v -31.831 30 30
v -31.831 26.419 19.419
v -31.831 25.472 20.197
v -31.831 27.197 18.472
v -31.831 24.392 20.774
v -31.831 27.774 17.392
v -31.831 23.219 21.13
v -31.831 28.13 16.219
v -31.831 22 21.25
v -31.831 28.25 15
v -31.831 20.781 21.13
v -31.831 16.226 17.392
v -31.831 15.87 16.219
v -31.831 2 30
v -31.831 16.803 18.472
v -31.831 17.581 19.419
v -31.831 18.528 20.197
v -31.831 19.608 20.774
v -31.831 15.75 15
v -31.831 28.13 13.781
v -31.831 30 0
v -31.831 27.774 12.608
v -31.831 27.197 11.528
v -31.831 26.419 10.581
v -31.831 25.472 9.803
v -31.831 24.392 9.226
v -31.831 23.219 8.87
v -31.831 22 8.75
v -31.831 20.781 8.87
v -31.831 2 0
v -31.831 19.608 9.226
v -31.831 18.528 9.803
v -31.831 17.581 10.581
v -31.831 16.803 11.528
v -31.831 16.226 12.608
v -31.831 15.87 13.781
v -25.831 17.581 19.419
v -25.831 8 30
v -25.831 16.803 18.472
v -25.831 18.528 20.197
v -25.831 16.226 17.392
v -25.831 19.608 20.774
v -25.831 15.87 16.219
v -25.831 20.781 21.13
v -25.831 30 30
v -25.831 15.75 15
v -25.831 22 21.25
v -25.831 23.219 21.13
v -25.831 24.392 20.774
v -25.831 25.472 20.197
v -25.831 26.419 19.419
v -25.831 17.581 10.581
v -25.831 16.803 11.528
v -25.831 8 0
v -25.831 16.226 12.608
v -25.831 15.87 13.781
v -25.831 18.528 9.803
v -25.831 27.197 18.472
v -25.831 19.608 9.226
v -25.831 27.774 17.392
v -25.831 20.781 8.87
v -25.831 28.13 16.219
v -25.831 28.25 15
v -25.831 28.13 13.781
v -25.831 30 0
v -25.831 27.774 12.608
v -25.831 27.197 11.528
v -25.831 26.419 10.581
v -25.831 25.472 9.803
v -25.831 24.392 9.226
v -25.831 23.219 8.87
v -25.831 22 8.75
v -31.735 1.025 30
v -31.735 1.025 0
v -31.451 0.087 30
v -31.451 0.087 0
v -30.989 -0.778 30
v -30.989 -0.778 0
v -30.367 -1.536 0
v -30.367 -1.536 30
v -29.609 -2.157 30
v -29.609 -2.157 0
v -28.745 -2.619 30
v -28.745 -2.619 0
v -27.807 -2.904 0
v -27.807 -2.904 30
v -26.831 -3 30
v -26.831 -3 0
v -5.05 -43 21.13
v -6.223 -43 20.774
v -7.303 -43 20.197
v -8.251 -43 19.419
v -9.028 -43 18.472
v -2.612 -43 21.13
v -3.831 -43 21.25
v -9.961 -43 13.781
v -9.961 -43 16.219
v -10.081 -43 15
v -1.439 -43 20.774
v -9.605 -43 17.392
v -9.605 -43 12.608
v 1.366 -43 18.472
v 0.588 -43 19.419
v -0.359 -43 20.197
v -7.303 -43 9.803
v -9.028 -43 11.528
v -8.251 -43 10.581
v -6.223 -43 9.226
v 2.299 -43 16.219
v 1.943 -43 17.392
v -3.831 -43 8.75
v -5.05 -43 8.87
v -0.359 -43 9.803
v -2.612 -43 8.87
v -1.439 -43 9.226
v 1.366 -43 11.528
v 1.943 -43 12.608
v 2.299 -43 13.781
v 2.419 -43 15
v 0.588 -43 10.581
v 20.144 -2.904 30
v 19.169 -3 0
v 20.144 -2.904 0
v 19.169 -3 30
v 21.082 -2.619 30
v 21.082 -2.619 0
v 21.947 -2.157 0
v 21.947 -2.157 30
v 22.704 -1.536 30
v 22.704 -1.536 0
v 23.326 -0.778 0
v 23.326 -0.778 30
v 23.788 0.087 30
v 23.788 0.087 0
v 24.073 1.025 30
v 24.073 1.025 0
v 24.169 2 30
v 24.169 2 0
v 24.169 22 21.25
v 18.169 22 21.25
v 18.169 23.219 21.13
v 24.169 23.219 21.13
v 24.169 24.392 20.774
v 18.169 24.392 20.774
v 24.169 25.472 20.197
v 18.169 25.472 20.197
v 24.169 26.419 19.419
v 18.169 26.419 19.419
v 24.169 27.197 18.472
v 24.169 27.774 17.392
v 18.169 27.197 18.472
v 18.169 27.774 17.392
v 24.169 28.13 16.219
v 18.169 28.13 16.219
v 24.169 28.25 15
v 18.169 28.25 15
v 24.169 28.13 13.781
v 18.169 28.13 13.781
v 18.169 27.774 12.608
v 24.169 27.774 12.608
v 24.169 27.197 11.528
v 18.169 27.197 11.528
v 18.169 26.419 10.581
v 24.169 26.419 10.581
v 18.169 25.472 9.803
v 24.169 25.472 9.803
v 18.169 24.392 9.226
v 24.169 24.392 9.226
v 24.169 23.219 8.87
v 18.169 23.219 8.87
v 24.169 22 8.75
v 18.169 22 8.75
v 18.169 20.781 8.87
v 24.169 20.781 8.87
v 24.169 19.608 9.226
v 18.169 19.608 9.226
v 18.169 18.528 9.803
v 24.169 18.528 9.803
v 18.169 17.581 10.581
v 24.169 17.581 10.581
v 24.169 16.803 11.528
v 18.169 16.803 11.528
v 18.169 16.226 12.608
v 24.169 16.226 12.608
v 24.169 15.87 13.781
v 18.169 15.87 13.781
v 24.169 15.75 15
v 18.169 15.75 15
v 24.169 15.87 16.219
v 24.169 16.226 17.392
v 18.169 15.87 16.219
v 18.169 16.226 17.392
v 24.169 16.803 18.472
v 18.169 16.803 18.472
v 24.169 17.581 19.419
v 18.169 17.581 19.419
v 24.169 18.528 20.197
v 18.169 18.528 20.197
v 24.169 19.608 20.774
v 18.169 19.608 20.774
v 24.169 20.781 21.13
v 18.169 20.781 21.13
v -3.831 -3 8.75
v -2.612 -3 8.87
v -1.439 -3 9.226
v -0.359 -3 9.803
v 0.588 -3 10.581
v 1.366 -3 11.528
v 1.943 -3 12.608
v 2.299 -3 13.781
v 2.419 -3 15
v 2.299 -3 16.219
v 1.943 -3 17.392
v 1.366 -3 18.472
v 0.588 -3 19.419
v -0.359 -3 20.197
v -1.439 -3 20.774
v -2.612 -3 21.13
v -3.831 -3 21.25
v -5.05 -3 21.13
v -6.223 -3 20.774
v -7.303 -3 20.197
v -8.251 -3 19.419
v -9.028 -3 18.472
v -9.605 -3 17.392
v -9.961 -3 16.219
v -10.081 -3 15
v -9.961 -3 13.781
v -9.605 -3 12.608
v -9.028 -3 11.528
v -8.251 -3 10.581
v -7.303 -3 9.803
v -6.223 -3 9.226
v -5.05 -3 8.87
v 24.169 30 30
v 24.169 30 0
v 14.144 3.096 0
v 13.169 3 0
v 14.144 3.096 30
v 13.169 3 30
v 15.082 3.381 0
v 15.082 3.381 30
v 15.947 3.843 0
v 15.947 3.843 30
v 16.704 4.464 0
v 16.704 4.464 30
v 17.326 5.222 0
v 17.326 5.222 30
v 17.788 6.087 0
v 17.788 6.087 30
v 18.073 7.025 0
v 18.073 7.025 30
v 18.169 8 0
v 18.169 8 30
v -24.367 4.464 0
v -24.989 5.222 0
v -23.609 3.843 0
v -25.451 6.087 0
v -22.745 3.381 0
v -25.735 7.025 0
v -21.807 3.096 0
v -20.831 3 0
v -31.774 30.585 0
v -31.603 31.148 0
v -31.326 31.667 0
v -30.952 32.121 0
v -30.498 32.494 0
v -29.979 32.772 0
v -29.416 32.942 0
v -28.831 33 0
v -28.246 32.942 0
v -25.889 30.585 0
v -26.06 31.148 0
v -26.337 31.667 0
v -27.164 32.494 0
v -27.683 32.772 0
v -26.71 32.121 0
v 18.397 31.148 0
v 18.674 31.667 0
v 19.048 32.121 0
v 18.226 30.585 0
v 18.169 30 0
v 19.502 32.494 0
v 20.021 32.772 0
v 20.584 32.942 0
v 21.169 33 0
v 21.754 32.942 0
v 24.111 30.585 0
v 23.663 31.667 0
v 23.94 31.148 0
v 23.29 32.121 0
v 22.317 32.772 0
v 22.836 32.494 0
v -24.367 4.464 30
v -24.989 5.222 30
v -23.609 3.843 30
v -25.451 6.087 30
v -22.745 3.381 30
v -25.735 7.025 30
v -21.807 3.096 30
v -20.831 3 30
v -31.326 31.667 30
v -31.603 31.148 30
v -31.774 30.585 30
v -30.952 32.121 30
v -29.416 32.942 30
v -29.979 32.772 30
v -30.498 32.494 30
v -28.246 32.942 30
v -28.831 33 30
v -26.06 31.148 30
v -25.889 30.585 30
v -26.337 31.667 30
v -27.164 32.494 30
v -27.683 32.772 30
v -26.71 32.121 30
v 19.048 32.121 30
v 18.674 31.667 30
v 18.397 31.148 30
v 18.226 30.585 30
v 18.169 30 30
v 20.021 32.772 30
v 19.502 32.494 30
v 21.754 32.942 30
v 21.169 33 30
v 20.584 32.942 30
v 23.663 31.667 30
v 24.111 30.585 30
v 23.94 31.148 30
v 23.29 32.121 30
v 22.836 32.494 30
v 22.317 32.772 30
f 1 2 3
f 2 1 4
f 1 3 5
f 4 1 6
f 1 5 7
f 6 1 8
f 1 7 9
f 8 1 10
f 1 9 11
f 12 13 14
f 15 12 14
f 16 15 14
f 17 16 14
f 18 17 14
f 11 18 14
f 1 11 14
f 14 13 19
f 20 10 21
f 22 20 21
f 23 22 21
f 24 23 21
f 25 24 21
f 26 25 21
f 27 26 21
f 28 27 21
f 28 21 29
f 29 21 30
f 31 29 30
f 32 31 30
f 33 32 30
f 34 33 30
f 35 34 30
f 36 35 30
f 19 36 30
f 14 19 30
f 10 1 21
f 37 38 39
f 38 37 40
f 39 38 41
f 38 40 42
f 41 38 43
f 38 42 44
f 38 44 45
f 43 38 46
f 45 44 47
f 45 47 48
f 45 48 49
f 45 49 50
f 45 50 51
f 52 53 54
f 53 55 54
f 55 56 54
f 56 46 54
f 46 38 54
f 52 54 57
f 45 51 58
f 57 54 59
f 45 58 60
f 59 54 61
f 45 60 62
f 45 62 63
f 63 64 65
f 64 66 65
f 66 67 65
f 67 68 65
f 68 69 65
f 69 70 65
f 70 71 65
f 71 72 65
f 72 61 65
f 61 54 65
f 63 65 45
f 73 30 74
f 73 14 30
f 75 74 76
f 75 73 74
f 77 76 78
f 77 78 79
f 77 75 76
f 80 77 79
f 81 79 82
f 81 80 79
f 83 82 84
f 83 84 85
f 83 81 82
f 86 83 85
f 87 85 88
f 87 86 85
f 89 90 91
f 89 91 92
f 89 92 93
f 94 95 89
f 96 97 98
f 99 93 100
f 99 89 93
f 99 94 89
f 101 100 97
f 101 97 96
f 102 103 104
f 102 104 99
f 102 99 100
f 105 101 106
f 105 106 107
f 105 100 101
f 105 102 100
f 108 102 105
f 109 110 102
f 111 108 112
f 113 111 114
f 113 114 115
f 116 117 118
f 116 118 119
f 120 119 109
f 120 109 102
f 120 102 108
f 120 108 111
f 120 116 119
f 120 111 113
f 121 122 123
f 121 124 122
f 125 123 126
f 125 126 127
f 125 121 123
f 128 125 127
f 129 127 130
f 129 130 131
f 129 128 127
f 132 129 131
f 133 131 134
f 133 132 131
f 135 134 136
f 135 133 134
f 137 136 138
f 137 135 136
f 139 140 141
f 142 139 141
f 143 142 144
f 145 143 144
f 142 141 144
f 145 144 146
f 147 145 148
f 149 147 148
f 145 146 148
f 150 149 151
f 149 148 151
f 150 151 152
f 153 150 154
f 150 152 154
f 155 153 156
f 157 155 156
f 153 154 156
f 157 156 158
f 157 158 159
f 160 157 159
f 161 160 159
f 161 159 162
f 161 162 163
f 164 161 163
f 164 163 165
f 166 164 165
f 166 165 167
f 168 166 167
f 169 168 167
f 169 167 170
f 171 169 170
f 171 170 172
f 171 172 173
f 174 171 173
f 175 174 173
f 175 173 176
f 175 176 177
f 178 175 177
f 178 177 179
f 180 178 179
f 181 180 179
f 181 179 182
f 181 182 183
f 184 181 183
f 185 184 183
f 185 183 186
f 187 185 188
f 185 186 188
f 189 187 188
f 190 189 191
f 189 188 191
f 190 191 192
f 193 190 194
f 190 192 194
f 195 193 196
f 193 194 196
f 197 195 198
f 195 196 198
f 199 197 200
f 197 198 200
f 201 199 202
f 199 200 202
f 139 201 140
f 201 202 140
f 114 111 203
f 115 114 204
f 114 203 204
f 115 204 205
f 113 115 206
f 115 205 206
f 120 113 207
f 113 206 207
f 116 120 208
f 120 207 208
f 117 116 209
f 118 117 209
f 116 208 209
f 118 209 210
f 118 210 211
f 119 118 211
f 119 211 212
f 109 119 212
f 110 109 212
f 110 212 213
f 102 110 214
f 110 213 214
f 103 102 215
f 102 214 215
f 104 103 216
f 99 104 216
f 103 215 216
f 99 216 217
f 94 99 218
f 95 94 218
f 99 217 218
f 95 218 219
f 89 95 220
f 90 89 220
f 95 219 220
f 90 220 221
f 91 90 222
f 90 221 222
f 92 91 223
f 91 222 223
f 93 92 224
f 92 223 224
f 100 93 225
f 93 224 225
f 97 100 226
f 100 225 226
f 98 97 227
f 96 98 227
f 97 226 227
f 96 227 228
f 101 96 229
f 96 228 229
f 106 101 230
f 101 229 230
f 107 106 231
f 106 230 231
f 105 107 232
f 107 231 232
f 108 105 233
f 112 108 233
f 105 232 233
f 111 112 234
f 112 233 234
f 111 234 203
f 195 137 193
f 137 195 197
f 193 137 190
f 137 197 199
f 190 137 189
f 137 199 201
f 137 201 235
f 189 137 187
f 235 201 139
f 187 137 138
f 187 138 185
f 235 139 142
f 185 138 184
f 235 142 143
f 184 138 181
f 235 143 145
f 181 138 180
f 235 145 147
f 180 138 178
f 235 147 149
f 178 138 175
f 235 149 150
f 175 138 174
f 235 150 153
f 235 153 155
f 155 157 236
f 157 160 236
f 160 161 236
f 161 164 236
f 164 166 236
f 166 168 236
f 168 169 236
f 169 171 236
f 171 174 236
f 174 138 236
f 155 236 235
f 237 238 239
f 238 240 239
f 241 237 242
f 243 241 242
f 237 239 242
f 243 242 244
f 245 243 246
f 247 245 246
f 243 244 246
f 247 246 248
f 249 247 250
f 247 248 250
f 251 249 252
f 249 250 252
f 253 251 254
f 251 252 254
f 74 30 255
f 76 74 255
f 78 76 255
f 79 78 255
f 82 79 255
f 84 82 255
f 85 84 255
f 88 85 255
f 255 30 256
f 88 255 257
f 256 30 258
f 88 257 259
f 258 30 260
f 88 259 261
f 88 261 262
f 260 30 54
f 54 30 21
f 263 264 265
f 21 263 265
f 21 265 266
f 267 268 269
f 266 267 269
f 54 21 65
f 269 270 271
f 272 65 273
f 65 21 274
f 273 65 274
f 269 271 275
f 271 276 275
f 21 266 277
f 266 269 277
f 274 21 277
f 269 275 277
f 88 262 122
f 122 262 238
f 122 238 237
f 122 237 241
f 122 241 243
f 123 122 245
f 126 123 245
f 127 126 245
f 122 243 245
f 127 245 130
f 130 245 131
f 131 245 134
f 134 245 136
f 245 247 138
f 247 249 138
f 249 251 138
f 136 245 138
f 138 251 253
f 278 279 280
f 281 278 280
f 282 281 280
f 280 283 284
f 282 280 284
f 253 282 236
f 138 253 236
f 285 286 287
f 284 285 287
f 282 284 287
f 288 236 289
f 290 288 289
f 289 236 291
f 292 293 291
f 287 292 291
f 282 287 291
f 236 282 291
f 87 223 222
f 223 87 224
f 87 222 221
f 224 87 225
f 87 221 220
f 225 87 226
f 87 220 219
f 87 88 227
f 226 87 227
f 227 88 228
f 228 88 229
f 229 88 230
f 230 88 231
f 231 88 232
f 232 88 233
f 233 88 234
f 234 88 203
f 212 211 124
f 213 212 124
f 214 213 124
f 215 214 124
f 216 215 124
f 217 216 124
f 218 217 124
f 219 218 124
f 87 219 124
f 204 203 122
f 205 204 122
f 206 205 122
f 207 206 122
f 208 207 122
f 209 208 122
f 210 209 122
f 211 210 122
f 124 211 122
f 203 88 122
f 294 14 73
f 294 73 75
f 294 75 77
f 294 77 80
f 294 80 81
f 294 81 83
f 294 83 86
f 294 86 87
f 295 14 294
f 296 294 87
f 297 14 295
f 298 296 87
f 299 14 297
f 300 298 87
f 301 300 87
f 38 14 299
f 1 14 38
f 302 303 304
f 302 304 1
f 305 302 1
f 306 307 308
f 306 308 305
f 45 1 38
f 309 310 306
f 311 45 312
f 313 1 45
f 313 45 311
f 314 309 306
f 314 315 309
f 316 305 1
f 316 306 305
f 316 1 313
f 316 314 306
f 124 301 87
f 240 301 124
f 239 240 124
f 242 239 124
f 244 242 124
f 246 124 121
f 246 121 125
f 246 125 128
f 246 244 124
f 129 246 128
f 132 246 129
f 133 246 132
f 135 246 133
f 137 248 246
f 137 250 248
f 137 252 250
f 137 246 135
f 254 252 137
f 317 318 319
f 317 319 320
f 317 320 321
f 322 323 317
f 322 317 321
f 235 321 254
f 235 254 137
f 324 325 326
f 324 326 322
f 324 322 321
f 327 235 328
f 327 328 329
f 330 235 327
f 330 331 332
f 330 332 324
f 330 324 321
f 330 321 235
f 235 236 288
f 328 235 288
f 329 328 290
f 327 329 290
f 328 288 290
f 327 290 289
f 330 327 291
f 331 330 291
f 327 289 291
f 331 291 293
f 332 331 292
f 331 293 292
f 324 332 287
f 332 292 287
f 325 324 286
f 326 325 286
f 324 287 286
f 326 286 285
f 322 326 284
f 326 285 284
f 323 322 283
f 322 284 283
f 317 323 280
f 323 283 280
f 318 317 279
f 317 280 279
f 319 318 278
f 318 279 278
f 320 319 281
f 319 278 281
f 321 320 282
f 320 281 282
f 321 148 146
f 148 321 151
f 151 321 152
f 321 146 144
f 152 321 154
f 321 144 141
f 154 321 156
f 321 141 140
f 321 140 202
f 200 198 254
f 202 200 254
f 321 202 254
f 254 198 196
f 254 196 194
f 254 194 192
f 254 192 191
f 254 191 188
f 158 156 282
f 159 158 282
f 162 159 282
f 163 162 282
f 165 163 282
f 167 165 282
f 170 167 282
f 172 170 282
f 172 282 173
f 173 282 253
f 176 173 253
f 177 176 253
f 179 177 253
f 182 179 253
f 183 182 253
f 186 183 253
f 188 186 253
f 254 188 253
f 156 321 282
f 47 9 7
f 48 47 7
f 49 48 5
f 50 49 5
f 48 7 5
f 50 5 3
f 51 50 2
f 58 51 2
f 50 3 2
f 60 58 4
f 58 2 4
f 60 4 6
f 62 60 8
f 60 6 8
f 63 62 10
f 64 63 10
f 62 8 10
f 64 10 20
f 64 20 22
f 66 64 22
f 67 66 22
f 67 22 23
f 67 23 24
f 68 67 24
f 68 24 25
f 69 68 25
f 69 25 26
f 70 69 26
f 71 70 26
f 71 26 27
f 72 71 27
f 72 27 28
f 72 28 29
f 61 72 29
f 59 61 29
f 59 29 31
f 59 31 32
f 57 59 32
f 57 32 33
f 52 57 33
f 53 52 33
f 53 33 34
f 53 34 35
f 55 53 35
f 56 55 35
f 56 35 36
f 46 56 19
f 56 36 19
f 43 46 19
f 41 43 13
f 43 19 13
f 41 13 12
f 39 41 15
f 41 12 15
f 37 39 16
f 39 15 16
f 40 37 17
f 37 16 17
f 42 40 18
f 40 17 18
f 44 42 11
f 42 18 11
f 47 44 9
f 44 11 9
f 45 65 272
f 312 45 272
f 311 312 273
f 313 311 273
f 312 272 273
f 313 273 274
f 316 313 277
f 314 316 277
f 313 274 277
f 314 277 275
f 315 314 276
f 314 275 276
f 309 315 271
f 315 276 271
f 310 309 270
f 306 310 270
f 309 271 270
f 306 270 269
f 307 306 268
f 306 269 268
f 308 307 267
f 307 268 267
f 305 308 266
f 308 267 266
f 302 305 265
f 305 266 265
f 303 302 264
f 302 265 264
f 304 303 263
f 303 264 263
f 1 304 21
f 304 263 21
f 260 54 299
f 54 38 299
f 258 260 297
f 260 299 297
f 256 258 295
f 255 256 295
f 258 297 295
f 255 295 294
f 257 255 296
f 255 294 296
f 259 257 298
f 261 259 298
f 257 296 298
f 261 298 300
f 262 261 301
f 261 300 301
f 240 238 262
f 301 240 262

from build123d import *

# Parameters (mm, degrees)
BOSS_EXTRUDE1_DEPTH = 30
SKETCH3_R           = 6.25
BOSS_EXTRUDE2_DEPTH = 40
FILLET1_R           = 5
FILLET2_R           = 5
SKETCH4_R           = 6.25
CUT_EXTRUDE2_DEPTH  = 60


with BuildPart() as part:
    # Sketch2 → Boss-Extrude1 (new body)
    with BuildSketch(Plane.XY):
        with BuildLine():
            Line((-31.831168831, 30), (-31.831168831, -3))
            Line((-31.831168831, -3), (24.168831169, -3))
            Line((24.168831169, -3), (24.168831169, 30))
            ThreePointArc((24.168831169, 30), (21.168831169, 33), (18.168831169, 30))
            Line((18.168831169, 30), (18.168831169, 3))
            Line((18.168831169, 3), (-25.831168831, 3))
            Line((-25.831168831, 3), (-25.831168831, 30))
            ThreePointArc((-25.831168831, 30), (-28.831168831, 33), (-31.831168831, 30))
        make_face()
    extrude(amount=BOSS_EXTRUDE1_DEPTH)

    # Sketch3 → Boss-Extrude2 (add)
    with BuildSketch(Plane.XZ.offset(3)):
        with Locations(Location((-3.831168831, 15, 0), (0, 0, 270))):
            Circle(SKETCH3_R)
    extrude(amount=BOSS_EXTRUDE2_DEPTH)

    # Fillet1
    fillet1_edges = [part.edges().sort_by_distance(p)[0] for p in [
        (-31.831168831, -3, 15),
    ]]
    fillet(fillet1_edges, radius=FILLET1_R)

    # Fillet2
    fillet2_edges = [part.edges().sort_by_distance(p)[0] for p in [
        (24.168831169, -3, 15),
        (-25.831168831, 3, 15),
        (18.168831169, 3, 15),
    ]]
    fillet(fillet2_edges, radius=FILLET2_R)

    # Sketch4 → Cut-Extrude2 (cut)
    with BuildSketch(Plane.ZY.offset(31.831168831)):
        with Locations((15, 22)):
            Circle(SKETCH4_R)
    extrude(amount=-CUT_EXTRUDE2_DEPTH, mode=Mode.SUBTRACT)


solid = part.part
